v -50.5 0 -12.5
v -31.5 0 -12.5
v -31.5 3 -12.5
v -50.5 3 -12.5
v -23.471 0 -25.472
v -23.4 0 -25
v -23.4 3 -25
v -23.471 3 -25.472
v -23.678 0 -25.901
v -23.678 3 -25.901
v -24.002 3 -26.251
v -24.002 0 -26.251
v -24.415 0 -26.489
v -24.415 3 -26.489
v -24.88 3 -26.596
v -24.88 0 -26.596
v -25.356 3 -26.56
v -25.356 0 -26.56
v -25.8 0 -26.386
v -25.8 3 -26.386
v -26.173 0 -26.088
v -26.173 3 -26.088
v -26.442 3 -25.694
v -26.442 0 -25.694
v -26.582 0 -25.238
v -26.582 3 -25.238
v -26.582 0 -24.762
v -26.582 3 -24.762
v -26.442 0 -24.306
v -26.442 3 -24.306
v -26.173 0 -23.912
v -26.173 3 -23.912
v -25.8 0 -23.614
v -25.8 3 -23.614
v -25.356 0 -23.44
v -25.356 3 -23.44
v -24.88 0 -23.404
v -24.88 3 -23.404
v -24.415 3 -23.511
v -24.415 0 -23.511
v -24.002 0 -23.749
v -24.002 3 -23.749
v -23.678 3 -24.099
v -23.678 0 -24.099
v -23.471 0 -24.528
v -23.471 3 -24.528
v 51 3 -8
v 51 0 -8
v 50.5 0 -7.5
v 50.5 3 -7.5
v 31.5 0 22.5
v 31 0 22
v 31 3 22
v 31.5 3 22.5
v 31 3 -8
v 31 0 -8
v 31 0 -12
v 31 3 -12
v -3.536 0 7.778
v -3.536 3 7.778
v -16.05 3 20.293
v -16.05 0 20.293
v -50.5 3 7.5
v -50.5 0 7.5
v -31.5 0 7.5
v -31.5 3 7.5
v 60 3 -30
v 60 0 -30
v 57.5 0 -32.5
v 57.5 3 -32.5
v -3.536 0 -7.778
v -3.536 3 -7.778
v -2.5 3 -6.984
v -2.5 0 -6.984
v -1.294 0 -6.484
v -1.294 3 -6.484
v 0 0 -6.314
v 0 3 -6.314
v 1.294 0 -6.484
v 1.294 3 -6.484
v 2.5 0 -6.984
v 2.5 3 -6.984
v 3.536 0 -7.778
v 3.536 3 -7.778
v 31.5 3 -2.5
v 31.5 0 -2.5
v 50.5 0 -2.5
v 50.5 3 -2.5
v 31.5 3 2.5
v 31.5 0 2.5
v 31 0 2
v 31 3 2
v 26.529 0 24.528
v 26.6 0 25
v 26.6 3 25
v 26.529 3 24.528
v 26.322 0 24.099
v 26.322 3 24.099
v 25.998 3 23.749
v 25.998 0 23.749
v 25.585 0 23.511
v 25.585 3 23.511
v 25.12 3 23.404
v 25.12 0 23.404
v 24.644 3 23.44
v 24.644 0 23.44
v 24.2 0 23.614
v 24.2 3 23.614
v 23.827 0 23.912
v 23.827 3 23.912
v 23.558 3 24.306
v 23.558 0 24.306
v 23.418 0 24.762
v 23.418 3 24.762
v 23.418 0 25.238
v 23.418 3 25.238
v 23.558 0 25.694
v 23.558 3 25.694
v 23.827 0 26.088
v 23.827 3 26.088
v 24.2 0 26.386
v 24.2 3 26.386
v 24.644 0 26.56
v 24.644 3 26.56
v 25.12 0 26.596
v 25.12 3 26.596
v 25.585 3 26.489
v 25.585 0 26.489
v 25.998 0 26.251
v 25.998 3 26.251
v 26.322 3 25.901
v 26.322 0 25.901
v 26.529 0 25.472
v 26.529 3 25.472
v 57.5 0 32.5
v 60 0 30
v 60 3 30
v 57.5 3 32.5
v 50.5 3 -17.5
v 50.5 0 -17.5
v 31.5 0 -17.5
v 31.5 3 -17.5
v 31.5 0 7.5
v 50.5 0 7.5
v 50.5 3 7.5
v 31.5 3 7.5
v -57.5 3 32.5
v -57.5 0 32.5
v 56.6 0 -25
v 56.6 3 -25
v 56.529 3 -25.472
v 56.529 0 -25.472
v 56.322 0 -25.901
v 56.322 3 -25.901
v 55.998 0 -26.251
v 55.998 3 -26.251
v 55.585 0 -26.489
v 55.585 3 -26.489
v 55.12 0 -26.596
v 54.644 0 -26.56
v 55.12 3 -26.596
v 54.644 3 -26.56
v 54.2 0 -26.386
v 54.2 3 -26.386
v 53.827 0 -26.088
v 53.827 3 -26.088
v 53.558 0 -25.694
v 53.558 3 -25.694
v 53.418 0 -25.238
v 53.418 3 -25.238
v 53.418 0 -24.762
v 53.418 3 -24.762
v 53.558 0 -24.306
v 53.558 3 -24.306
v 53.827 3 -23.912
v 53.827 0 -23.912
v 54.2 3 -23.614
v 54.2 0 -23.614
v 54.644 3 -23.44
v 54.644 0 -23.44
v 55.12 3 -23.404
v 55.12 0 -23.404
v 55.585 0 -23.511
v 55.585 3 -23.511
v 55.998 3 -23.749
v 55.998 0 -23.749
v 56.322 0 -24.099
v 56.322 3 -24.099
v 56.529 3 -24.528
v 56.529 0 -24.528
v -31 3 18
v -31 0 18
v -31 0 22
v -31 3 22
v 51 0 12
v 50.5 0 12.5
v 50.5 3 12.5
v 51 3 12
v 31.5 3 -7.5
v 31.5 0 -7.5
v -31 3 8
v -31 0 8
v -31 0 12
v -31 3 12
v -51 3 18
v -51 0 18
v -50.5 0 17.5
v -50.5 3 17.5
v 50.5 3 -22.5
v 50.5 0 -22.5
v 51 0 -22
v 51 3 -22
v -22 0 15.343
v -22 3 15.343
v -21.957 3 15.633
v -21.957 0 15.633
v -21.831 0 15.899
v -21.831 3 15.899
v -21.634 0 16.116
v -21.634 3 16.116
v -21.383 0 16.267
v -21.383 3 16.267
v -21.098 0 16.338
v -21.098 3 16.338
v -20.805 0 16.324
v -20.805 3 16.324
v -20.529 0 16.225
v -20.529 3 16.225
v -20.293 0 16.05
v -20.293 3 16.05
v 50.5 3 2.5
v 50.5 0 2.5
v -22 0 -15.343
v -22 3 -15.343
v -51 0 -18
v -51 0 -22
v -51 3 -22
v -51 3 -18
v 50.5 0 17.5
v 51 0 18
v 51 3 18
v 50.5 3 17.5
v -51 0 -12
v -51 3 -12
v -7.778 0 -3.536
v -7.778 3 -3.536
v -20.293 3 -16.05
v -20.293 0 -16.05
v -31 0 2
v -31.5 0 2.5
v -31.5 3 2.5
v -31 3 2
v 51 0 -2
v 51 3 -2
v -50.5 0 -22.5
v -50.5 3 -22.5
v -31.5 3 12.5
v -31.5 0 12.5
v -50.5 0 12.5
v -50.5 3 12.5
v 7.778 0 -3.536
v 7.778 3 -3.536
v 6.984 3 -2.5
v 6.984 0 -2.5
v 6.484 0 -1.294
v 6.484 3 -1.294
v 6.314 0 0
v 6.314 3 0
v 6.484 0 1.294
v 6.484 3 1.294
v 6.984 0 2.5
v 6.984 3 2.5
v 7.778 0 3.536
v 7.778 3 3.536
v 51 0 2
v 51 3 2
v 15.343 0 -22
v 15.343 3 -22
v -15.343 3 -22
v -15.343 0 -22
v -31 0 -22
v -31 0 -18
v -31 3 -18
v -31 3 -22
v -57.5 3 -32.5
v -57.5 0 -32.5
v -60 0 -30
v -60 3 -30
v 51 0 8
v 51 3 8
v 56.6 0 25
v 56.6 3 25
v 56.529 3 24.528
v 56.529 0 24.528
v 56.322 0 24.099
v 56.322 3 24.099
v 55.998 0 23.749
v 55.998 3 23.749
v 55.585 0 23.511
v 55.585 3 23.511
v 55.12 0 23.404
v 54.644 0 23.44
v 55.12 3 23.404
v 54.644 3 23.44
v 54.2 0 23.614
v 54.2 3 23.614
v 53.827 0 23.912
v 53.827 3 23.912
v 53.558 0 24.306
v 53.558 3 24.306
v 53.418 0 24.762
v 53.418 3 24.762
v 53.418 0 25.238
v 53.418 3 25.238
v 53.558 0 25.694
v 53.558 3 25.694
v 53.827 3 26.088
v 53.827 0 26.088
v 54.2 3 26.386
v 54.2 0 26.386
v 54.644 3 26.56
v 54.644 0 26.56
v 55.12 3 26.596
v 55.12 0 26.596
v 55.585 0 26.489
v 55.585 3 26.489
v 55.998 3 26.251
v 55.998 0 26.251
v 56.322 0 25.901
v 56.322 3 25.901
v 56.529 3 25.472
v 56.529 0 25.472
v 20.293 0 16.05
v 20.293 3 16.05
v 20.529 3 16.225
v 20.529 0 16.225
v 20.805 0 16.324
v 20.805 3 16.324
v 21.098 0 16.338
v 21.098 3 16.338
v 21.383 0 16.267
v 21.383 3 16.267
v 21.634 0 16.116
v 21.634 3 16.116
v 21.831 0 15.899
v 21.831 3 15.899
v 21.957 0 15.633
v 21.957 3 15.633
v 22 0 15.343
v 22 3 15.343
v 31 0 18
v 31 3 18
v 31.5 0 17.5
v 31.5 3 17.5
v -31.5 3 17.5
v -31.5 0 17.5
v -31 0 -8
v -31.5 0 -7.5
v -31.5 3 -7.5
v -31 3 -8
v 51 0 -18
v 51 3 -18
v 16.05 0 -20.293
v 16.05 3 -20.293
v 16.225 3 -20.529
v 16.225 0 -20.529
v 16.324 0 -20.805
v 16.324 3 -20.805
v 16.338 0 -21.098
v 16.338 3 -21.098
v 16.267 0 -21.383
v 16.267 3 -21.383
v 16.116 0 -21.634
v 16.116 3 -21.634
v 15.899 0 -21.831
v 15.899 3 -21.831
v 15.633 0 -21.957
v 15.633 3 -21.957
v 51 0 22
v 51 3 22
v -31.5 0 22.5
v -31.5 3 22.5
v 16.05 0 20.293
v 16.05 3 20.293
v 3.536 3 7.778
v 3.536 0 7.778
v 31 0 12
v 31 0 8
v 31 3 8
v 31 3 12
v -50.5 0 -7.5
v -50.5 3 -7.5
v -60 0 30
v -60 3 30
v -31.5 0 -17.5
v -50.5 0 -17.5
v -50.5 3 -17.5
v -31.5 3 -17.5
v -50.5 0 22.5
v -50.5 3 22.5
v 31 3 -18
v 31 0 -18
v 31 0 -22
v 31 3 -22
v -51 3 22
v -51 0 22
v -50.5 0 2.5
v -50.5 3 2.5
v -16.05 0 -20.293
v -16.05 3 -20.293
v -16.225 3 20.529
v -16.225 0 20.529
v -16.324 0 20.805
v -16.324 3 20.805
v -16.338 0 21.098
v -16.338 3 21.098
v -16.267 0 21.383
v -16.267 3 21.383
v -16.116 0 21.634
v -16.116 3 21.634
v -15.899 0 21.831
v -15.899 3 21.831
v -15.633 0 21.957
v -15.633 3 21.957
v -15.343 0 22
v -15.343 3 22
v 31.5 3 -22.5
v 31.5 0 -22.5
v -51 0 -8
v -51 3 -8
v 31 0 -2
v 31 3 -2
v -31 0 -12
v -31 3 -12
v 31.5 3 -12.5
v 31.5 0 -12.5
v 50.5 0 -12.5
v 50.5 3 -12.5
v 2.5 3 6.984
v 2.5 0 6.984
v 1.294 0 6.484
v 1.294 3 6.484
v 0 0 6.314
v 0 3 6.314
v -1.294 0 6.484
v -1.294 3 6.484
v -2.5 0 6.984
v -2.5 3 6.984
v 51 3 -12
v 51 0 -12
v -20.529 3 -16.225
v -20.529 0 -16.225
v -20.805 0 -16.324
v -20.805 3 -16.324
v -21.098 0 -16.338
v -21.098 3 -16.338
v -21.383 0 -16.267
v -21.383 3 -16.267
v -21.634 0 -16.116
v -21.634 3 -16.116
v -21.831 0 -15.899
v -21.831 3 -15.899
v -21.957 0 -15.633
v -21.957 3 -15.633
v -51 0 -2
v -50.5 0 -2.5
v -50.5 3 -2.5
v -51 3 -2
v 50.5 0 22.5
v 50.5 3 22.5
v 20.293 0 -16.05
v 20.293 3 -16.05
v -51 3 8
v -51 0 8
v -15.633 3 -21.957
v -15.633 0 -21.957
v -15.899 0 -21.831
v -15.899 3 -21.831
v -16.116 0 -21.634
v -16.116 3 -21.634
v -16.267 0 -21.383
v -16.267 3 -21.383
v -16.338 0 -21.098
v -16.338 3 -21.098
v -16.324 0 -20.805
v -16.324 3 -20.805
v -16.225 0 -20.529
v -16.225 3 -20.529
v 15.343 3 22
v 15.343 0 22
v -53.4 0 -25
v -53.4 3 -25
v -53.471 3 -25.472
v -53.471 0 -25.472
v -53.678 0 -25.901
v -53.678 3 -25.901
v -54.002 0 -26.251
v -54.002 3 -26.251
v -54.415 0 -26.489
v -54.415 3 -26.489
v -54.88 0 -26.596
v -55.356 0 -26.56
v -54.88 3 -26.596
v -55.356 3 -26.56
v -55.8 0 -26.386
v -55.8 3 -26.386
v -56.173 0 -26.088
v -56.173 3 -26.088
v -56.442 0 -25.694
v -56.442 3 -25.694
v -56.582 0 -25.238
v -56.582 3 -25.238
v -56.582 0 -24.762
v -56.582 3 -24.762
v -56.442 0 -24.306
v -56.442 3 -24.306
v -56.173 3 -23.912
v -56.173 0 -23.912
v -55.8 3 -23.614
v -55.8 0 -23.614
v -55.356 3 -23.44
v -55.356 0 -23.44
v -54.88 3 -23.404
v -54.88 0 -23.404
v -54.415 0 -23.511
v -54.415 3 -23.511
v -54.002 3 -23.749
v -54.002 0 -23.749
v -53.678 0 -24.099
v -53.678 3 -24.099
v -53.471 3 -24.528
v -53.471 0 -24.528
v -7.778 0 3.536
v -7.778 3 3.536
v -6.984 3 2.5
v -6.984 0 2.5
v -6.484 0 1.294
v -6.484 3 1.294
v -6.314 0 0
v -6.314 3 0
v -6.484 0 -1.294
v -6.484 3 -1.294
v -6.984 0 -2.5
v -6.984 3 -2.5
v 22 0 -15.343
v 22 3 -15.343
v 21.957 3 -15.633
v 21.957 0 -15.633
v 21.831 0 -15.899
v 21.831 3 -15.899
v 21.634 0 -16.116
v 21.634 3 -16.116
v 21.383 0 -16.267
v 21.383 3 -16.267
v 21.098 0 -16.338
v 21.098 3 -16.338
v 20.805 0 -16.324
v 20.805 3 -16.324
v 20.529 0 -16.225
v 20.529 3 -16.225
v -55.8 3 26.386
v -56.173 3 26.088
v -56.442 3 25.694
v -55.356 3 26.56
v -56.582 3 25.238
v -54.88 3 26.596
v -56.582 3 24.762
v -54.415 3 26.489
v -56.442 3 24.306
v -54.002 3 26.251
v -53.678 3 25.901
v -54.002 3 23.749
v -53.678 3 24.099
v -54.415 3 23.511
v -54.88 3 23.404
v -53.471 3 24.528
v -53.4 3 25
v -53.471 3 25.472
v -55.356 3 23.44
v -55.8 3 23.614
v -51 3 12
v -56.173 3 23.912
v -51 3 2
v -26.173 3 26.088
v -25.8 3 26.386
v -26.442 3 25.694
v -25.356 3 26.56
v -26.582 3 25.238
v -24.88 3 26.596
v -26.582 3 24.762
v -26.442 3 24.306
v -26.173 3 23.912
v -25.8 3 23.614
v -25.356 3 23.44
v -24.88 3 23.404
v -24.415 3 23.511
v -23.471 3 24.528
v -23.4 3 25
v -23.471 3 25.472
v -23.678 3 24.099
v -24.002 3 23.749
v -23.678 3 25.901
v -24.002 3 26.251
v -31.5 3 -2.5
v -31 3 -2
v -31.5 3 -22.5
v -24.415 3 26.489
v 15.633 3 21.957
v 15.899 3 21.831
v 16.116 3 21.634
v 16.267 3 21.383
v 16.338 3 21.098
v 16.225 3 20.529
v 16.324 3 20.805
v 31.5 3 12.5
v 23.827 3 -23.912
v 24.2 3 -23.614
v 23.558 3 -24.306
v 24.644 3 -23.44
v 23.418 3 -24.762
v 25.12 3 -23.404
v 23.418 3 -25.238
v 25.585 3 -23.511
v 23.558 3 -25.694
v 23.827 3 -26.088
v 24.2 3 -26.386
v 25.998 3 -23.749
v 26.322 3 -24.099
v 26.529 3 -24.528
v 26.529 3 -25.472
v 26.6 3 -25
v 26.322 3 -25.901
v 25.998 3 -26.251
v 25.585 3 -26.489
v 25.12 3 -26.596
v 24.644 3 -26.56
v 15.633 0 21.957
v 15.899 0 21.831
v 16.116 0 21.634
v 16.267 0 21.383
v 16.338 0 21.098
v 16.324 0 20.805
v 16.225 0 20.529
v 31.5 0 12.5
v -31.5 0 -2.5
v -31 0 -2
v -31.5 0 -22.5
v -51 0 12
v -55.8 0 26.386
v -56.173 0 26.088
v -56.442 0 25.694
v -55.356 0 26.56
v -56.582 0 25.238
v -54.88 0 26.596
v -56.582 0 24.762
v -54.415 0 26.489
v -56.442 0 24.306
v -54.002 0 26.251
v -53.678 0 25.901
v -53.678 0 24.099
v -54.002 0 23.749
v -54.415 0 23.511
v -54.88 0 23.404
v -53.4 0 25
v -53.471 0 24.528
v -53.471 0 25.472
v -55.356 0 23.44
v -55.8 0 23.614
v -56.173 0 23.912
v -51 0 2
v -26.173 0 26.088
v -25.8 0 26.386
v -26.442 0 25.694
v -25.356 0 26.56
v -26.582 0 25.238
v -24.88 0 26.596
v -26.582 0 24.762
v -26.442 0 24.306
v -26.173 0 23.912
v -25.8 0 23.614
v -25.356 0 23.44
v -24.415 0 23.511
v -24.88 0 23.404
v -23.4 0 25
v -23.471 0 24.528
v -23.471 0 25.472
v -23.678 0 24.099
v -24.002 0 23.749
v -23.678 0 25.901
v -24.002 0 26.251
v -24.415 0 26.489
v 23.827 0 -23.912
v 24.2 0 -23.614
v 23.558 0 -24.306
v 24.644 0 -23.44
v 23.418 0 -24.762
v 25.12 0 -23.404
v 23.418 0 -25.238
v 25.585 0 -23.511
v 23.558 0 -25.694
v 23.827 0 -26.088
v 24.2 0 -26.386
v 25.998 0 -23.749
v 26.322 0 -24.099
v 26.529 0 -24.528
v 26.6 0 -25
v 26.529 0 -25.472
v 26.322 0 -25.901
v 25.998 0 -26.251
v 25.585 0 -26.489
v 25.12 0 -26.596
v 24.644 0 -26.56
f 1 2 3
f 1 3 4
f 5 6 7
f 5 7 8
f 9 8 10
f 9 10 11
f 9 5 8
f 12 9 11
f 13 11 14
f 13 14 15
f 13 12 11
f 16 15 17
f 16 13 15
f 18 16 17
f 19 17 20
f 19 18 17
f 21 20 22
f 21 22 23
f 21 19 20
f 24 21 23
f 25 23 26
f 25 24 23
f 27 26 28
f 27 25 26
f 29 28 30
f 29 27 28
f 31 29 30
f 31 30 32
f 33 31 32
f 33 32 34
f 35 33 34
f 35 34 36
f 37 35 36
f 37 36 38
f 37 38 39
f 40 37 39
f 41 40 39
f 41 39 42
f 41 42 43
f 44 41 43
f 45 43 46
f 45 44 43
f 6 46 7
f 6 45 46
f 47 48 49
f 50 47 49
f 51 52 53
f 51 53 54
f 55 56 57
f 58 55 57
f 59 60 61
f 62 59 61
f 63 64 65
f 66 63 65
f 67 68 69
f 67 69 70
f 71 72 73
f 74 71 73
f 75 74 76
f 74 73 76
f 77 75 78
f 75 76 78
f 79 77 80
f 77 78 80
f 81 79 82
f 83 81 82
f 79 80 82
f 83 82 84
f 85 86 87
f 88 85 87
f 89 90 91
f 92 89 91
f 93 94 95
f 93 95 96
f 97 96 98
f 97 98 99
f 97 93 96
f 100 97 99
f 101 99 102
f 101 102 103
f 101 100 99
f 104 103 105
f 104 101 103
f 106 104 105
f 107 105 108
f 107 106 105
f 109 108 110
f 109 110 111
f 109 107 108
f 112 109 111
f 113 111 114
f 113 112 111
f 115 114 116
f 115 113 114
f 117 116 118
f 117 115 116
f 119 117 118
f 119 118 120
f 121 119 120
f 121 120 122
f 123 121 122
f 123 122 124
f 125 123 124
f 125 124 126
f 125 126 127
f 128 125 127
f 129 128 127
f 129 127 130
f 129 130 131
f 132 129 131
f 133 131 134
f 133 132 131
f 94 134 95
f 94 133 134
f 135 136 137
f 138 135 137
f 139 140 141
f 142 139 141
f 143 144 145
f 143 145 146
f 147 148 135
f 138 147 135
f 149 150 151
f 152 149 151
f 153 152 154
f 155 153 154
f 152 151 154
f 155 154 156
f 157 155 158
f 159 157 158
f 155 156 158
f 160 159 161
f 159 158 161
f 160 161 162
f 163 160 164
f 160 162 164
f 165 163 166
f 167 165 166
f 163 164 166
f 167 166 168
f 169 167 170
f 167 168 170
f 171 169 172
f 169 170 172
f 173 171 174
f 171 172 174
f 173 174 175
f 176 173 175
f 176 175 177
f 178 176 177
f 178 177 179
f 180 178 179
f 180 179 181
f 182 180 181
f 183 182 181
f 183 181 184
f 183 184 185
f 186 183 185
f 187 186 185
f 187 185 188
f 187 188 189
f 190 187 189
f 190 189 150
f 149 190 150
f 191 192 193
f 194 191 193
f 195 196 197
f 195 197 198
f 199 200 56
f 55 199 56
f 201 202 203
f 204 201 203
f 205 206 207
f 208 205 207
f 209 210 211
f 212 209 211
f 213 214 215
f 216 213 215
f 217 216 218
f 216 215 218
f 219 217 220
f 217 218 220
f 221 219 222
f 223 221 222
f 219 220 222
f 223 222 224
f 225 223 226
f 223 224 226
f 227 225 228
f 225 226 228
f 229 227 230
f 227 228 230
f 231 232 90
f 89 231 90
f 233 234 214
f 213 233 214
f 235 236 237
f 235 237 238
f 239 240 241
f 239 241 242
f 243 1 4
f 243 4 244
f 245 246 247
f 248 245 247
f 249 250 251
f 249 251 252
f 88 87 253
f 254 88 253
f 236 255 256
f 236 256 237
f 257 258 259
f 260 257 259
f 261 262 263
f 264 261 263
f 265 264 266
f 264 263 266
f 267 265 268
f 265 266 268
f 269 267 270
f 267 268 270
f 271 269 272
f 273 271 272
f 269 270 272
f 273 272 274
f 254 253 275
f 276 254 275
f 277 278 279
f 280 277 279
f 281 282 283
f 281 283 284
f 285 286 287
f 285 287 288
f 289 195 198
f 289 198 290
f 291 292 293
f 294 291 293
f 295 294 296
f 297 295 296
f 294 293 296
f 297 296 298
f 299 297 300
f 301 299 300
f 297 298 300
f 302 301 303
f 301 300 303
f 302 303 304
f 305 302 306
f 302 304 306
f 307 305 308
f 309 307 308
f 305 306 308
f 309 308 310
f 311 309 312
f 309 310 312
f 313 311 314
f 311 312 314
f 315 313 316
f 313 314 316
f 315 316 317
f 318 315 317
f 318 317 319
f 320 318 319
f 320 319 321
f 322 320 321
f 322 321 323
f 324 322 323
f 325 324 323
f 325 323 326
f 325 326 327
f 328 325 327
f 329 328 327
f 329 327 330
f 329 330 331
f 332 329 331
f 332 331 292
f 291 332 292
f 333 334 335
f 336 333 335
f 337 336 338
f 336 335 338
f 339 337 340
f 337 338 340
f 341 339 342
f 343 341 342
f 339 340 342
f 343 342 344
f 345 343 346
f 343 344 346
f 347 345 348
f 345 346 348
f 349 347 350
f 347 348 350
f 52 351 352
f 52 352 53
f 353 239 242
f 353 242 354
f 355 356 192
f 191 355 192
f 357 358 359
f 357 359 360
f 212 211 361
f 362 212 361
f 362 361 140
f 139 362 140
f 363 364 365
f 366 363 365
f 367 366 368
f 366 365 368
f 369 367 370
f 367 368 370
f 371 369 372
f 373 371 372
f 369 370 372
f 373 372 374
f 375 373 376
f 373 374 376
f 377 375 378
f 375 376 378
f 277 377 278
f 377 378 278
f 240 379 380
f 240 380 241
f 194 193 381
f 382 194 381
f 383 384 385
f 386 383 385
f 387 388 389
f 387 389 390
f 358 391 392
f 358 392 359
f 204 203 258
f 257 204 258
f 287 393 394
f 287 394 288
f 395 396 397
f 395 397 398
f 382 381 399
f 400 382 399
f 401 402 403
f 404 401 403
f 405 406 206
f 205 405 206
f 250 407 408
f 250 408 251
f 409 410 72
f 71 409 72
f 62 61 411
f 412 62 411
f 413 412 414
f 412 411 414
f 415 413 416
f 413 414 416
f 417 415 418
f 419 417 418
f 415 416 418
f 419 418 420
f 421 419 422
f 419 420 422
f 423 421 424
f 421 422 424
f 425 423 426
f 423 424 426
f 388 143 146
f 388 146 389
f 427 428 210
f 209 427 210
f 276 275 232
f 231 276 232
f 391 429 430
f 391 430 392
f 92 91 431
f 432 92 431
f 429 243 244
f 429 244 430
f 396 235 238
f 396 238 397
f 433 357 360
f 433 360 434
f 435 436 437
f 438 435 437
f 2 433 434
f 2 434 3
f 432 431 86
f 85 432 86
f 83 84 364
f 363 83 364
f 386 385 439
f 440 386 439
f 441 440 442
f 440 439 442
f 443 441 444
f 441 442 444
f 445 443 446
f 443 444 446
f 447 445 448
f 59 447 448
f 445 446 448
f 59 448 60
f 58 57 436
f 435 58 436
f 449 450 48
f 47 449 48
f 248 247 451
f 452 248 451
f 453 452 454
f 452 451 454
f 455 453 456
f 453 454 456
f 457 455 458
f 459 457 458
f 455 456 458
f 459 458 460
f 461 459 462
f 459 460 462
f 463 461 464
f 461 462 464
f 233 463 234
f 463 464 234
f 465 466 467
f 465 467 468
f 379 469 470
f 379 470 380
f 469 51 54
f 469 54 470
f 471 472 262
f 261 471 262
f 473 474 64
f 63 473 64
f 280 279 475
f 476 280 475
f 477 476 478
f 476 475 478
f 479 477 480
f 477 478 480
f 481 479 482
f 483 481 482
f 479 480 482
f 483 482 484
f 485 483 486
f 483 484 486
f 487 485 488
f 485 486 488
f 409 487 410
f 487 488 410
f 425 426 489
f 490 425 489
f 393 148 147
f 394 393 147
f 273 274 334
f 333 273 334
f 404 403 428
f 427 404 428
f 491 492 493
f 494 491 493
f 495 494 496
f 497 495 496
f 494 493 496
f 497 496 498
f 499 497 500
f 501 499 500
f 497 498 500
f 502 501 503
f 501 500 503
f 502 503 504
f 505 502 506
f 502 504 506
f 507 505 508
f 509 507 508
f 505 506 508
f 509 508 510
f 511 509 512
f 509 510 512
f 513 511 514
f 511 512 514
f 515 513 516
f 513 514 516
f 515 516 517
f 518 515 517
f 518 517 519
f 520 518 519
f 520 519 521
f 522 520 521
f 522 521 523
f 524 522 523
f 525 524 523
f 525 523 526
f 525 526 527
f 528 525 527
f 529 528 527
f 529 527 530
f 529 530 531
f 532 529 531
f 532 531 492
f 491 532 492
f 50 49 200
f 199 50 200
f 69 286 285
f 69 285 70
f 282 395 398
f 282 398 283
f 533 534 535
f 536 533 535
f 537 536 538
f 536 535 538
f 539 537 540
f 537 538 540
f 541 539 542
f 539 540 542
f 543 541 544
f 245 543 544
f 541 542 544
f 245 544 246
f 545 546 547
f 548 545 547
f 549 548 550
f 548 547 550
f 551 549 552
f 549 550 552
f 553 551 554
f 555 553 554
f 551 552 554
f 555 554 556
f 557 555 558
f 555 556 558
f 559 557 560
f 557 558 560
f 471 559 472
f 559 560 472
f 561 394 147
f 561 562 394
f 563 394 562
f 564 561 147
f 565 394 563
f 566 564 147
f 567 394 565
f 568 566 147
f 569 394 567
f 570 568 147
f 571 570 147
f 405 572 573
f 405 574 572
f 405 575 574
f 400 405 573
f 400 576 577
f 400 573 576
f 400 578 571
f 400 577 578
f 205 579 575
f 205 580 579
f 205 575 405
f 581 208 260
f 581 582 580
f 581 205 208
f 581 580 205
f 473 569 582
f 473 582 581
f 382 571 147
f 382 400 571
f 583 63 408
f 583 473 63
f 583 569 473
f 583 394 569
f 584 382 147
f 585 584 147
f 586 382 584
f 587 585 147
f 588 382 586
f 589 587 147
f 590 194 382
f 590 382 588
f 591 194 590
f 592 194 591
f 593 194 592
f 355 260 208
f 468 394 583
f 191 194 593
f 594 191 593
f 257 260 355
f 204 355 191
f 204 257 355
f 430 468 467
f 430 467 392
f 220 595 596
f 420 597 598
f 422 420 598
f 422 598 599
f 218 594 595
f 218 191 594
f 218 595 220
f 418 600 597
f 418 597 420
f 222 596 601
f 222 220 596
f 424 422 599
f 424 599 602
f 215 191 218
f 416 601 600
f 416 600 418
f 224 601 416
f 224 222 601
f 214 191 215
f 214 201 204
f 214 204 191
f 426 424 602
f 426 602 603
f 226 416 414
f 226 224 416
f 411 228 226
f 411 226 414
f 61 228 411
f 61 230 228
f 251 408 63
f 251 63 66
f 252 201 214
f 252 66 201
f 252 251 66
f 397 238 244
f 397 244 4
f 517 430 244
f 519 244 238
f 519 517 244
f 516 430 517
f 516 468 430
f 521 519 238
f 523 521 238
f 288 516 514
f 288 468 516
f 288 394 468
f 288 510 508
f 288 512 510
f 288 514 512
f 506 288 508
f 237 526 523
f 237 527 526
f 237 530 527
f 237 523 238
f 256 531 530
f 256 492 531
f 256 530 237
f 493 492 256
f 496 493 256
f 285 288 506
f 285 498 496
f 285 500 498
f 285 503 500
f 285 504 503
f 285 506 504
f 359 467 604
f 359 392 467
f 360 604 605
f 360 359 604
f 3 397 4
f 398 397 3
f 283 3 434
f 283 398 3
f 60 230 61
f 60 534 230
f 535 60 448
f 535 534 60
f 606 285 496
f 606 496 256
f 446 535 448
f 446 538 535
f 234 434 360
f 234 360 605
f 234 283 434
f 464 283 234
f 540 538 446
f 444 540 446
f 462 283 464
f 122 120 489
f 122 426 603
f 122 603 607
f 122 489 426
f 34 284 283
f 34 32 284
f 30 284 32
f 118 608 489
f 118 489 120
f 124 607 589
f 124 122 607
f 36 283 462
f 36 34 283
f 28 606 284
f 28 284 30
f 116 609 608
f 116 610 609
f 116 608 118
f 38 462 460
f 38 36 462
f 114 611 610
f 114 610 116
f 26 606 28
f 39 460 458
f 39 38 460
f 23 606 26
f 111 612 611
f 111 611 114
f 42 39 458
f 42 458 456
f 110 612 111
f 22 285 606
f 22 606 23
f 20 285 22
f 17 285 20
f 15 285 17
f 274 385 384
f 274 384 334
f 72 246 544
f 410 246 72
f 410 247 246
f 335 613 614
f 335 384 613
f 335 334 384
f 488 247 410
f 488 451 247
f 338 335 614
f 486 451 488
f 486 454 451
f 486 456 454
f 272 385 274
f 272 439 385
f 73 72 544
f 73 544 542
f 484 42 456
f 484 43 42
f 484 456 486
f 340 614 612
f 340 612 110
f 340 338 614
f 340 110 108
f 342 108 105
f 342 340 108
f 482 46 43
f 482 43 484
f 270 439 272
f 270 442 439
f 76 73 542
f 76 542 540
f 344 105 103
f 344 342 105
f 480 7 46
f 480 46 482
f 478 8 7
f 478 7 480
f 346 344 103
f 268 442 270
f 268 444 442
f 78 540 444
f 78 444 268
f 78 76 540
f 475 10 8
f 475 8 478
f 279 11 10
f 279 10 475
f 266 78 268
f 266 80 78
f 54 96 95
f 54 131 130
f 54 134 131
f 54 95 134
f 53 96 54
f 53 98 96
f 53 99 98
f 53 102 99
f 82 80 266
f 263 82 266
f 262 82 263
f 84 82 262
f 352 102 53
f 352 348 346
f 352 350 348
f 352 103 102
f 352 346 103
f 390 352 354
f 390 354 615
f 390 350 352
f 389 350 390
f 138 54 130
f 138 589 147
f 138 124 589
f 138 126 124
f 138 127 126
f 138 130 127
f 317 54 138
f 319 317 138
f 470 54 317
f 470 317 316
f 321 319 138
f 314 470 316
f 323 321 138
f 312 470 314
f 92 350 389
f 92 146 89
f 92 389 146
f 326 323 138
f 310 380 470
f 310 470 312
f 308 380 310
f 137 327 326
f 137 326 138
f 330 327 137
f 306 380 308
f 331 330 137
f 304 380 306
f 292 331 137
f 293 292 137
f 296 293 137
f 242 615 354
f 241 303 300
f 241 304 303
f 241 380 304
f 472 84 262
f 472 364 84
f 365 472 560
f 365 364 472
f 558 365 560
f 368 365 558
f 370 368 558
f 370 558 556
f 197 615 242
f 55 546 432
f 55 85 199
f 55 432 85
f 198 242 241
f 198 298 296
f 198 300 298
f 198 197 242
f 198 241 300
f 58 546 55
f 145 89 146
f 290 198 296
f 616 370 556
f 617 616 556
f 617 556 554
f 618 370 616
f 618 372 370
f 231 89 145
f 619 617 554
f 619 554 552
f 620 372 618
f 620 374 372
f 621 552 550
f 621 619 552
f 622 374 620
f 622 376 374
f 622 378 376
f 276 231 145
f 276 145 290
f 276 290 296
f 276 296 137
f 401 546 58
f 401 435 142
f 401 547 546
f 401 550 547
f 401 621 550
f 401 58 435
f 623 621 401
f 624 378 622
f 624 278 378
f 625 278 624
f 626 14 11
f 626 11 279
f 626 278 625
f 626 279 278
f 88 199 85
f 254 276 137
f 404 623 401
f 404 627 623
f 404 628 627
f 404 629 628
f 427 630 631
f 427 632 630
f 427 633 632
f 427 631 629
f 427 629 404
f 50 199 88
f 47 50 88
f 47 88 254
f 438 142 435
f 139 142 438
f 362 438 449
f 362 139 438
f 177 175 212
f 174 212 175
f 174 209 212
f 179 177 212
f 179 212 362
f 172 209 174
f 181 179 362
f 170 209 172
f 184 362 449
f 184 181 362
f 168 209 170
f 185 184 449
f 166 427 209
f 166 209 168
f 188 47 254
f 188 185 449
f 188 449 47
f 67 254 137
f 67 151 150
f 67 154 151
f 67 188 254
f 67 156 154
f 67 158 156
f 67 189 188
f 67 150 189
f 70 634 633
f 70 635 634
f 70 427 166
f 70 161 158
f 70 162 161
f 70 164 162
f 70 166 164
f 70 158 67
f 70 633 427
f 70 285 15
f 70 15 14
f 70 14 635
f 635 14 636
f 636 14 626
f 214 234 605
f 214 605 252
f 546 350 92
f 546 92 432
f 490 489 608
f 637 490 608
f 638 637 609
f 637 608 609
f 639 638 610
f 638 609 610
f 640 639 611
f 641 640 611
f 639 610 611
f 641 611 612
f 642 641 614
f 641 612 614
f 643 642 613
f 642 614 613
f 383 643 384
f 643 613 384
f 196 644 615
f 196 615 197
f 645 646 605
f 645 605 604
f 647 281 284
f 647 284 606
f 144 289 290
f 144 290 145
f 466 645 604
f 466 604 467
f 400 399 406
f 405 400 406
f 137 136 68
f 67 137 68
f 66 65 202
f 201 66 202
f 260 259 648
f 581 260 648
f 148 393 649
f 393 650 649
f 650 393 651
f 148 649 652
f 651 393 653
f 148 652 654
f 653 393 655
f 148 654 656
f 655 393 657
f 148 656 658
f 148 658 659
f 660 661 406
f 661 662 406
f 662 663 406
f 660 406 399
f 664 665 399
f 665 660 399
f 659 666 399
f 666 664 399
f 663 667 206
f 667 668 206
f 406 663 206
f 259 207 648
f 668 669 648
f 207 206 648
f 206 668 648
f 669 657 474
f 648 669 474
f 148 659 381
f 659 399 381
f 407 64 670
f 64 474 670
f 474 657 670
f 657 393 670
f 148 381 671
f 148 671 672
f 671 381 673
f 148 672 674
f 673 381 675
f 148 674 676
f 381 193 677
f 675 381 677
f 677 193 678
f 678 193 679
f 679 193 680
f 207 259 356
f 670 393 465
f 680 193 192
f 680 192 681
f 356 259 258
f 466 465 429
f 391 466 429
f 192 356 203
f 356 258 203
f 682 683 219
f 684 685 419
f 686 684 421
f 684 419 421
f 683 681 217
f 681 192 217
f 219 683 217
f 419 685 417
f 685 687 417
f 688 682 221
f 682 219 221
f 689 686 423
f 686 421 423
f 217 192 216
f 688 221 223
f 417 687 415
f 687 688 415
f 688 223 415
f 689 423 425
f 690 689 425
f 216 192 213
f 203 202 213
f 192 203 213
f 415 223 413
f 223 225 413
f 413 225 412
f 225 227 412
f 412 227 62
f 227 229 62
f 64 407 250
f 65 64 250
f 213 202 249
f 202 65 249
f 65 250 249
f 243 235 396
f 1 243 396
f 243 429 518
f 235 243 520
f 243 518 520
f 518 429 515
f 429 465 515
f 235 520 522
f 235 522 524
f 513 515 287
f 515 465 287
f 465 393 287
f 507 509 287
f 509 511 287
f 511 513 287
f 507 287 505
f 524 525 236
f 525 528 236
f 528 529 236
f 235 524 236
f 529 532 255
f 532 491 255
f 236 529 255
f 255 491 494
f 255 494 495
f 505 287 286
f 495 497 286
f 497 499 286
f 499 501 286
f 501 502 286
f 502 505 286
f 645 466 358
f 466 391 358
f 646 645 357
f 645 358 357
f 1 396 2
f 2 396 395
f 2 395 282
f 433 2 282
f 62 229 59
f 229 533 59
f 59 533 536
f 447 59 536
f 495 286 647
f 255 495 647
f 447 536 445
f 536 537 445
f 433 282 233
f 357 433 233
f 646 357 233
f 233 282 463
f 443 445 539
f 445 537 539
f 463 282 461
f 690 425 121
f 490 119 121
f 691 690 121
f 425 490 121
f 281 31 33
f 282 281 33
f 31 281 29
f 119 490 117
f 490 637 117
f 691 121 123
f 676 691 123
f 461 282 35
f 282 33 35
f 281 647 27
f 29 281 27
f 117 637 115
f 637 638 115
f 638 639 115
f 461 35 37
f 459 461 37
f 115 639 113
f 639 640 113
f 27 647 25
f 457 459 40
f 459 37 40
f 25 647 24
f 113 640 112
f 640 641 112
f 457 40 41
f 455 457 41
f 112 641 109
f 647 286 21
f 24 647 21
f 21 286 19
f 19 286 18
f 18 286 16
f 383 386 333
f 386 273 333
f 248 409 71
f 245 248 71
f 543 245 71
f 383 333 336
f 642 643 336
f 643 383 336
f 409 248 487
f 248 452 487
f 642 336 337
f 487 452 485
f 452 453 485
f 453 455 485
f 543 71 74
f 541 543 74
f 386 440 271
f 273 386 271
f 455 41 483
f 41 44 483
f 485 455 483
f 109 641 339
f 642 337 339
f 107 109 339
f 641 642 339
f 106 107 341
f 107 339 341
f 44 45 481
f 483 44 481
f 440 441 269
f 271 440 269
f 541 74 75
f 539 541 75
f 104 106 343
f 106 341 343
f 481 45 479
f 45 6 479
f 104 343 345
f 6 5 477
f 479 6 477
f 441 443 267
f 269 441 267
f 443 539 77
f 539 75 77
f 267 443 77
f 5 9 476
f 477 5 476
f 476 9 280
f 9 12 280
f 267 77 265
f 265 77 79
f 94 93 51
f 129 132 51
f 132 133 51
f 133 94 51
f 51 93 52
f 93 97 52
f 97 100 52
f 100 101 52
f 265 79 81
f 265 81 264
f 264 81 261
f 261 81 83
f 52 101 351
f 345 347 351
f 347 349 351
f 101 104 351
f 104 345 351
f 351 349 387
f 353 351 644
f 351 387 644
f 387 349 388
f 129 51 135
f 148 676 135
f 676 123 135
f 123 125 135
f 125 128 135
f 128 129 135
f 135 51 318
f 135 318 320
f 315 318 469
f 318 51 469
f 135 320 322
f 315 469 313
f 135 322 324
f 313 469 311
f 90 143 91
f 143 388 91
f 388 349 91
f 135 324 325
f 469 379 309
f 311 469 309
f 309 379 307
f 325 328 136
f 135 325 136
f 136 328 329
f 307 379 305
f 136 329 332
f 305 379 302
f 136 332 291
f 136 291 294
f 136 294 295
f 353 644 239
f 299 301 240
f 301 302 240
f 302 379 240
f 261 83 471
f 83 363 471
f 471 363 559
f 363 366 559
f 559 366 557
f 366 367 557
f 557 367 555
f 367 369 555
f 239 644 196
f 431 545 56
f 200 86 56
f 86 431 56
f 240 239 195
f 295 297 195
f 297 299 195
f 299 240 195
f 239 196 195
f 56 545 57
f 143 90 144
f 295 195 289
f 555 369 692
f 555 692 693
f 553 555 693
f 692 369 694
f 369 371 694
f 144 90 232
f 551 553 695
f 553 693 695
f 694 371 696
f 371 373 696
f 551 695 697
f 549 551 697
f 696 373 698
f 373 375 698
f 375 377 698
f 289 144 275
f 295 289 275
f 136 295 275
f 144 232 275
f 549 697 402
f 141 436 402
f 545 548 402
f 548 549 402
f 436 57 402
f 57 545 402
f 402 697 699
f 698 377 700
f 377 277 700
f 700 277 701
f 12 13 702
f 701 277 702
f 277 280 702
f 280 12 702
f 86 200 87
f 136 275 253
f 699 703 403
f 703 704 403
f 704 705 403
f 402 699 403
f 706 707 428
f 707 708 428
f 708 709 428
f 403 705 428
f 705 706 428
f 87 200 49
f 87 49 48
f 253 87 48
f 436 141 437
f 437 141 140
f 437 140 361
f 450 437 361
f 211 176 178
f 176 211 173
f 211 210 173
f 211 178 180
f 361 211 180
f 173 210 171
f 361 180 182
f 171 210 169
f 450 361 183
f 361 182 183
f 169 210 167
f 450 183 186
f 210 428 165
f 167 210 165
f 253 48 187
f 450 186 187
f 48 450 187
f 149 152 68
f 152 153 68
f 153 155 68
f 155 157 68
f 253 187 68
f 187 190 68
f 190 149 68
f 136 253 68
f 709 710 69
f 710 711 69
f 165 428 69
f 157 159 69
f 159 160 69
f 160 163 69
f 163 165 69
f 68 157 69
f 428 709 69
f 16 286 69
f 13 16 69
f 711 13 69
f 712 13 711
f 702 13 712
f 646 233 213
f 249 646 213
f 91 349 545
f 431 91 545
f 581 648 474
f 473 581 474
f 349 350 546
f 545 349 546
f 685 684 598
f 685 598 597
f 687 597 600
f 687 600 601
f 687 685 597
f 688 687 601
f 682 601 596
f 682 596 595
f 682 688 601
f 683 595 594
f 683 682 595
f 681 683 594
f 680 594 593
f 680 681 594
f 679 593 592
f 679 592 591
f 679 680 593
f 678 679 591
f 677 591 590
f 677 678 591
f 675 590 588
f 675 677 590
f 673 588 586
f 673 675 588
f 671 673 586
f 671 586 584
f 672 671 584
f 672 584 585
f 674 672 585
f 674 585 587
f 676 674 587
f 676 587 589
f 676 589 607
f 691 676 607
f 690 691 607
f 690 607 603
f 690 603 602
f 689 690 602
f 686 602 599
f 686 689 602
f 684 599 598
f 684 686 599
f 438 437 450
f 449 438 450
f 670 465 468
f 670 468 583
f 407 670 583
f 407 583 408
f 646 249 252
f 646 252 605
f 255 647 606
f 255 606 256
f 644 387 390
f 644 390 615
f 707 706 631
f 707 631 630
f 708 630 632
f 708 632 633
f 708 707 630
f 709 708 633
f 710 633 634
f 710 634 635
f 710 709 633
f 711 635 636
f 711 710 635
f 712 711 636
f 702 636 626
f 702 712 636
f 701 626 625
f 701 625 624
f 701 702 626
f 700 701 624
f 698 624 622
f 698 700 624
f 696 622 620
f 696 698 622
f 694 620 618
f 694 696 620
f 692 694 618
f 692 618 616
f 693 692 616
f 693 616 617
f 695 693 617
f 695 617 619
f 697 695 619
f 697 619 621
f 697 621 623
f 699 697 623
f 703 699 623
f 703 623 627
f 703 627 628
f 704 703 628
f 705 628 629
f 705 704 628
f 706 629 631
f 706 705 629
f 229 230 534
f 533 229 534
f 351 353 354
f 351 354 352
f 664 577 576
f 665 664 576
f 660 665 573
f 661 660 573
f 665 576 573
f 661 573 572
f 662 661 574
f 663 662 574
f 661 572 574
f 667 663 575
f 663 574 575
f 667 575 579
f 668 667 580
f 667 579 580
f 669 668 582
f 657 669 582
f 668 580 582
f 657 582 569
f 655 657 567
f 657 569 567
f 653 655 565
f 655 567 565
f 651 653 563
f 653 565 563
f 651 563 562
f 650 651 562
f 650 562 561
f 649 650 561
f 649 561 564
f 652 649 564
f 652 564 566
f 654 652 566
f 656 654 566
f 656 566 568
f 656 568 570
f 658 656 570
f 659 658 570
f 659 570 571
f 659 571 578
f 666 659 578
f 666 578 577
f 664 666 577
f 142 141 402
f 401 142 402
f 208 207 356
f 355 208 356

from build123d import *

# Parameters (mm, degrees)
SKETCH_1_W          = 120
SKETCH_1_H          = 65
SKETCH_1_R          = 1.6
EXTRUDE_1_DEPTH     = 3
CUT_EXTRUDE_1_REACH = 5
SKETCH_2_R          = 1.6
CUT_EXTRUDE_2_REACH = 5
CUT_EXTRUDE_3_DEPTH = 3
CHAMFER_1_SIZE      = 2.5


with BuildPart() as part:
    # 草图1 → 凸台-拉伸1 (new body)
    with BuildSketch(Plane(origin=(0, 0, 0), x_dir=(1, 0, 0), z_dir=(0, 1, 0))):
        Rectangle(SKETCH_1_W, SKETCH_1_H)
        with Locations((-25, 25)):
            Circle(SKETCH_1_R, mode=Mode.SUBTRACT)
        with Locations((25, 25)):
            Circle(SKETCH_1_R, mode=Mode.SUBTRACT)
        with Locations((25, -25)):
            Circle(SKETCH_1_R, mode=Mode.SUBTRACT)
        with Locations((-25, -25)):
            Circle(SKETCH_1_R, mode=Mode.SUBTRACT)
    extrude(amount=EXTRUDE_1_DEPTH)

    # 草图2 → 切除-拉伸1 (cut, up to next)
    with BuildSketch(Plane(origin=(0, 3, 0), x_dir=(1, 0, 0), z_dir=(0, 1, 0)), mode=Mode.PRIVATE) as cut_extrude_1_sk1:
        with Locations((55, 25)):
            Circle(SKETCH_2_R)
    cut_extrude_1_tool1 = extrude(cut_extrude_1_sk1.sketch, amount=-CUT_EXTRUDE_1_REACH, mode=Mode.PRIVATE) & part.part
    add(cut_extrude_1_tool1.solids().sort_by_distance((55, 3, -25))[0], mode=Mode.SUBTRACT)
    # 草图2 → 切除-拉伸1 (cut, up to next)
    with BuildSketch(Plane(origin=(0, 3, 0), x_dir=(1, 0, 0), z_dir=(0, 1, 0)), mode=Mode.PRIVATE) as cut_extrude_1_sk2:
        with Locations((55, -25)):
            Circle(SKETCH_2_R)
    cut_extrude_1_tool2 = extrude(cut_extrude_1_sk2.sketch, amount=-CUT_EXTRUDE_1_REACH, mode=Mode.PRIVATE) & part.part
    add(cut_extrude_1_tool2.solids().sort_by_distance((55, 3, 25))[0], mode=Mode.SUBTRACT)
    # 草图2 → 切除-拉伸1 (cut, up to next)
    with BuildSketch(Plane(origin=(0, 3, 0), x_dir=(1, 0, 0), z_dir=(0, 1, 0)), mode=Mode.PRIVATE) as cut_extrude_1_sk3:
        with Locations((-55, -25)):
            Circle(SKETCH_2_R)
    cut_extrude_1_tool3 = extrude(cut_extrude_1_sk3.sketch, amount=-CUT_EXTRUDE_1_REACH, mode=Mode.PRIVATE) & part.part
    add(cut_extrude_1_tool3.solids().sort_by_distance((-55, 3, 25))[0], mode=Mode.SUBTRACT)
    # 草图2 → 切除-拉伸1 (cut, up to next)
    with BuildSketch(Plane(origin=(0, 3, 0), x_dir=(1, 0, 0), z_dir=(0, 1, 0)), mode=Mode.PRIVATE) as cut_extrude_1_sk4:
        with Locations((-55, 25)):
            Circle(SKETCH_2_R)
    cut_extrude_1_tool4 = extrude(cut_extrude_1_sk4.sketch, amount=-CUT_EXTRUDE_1_REACH, mode=Mode.PRIVATE) & part.part
    add(cut_extrude_1_tool4.solids().sort_by_distance((-55, 3, -25))[0], mode=Mode.SUBTRACT)

    # 草图3 → 切除-拉伸2 (cut, up to next)
    with BuildSketch(Plane(origin=(0, 3, 0), x_dir=(1, 0, 0), z_dir=(0, 1, 0)), mode=Mode.PRIVATE) as cut_extrude_2_sk1:
        with BuildLine():
            Line((-22, 15.343145751), (-22, -15.343145751))
            ThreePointArc((-22, -15.343145751), (-21.382683432, -16.267025283), (-20.292893219, -16.050252532))
            Line((-20.292893219, -16.050252532), (-7.778174593, -3.535533906))
            ThreePointArc((-7.778174593, -3.535533906), (-6.313708499, 0), (-7.778174593, 3.535533906))
            Line((-7.778174593, 3.535533906), (-20.292893219, 16.050252532))
            ThreePointArc((-20.292893219, 16.050252532), (-21.382683432, 16.267025283), (-22, 15.343145751))
        make_face()
    cut_extrude_2_tool1 = extrude(cut_extrude_2_sk1.sketch, amount=-CUT_EXTRUDE_2_REACH, mode=Mode.PRIVATE) & part.part
    add(cut_extrude_2_tool1.solids().sort_by_distance((-16.215858, 3, 0))[0], mode=Mode.SUBTRACT)
    # 草图3 → 切除-拉伸2 (cut, up to next)
    with BuildSketch(Plane(origin=(0, 3, 0), x_dir=(1, 0, 0), z_dir=(0, 1, 0)), mode=Mode.PRIVATE) as cut_extrude_2_sk2:
        with BuildLine():
            Line((15.343145751, 22), (-15.343145751, 22))
            ThreePointArc((-15.343145751, 22), (-16.267025283, 21.382683432), (-16.050252532, 20.292893219))
            Line((-16.050252532, 20.292893219), (-3.535533906, 7.778174593))
            ThreePointArc((-3.535533906, 7.778174593), (0, 6.313708499), (3.535533906, 7.778174593))
            Line((3.535533906, 7.778174593), (16.050252532, 20.292893219))
            ThreePointArc((16.050252532, 20.292893219), (16.267025283, 21.382683432), (15.343145751, 22))
        make_face()
    cut_extrude_2_tool2 = extrude(cut_extrude_2_sk2.sketch, amount=-CUT_EXTRUDE_2_REACH, mode=Mode.PRIVATE) & part.part
    add(cut_extrude_2_tool2.solids().sort_by_distance((0, 3, -16.215858))[0], mode=Mode.SUBTRACT)
    # 草图3 → 切除-拉伸2 (cut, up to next)
    with BuildSketch(Plane(origin=(0, 3, 0), x_dir=(1, 0, 0), z_dir=(0, 1, 0)), mode=Mode.PRIVATE) as cut_extrude_2_sk3:
        with BuildLine():
            Line((22, -15.343145751), (22, 15.343145751))
            ThreePointArc((22, 15.343145751), (21.382683432, 16.267025283), (20.292893219, 16.050252532))
            Line((20.292893219, 16.050252532), (7.778174593, 3.535533906))
            ThreePointArc((7.778174593, 3.535533906), (6.313708499, 0), (7.778174593, -3.535533906))
            Line((7.778174593, -3.535533906), (20.292893219, -16.050252532))
            ThreePointArc((20.292893219, -16.050252532), (21.382683432, -16.267025283), (22, -15.343145751))
        make_face()
    cut_extrude_2_tool3 = extrude(cut_extrude_2_sk3.sketch, amount=-CUT_EXTRUDE_2_REACH, mode=Mode.PRIVATE) & part.part
    add(cut_extrude_2_tool3.solids().sort_by_distance((16.215858, 3, 0))[0], mode=Mode.SUBTRACT)
    # 草图3 → 切除-拉伸2 (cut, up to next)
    with BuildSketch(Plane(origin=(0, 3, 0), x_dir=(1, 0, 0), z_dir=(0, 1, 0)), mode=Mode.PRIVATE) as cut_extrude_2_sk4:
        with BuildLine():
            Line((-15.343145751, -22), (15.343145751, -22))
            ThreePointArc((15.343145751, -22), (16.267025283, -21.382683432), (16.050252532, -20.292893219))
            Line((16.050252532, -20.292893219), (3.535533906, -7.778174593))
            ThreePointArc((3.535533906, -7.778174593), (0, -6.313708499), (-3.535533906, -7.778174593))
            Line((-3.535533906, -7.778174593), (-16.050252532, -20.292893219))
            ThreePointArc((-16.050252532, -20.292893219), (-16.267025283, -21.382683432), (-15.343145751, -22))
        make_face()
    cut_extrude_2_tool4 = extrude(cut_extrude_2_sk4.sketch, amount=-CUT_EXTRUDE_2_REACH, mode=Mode.PRIVATE) & part.part
    add(cut_extrude_2_tool4.solids().sort_by_distance((0, 3, 16.215858))[0], mode=Mode.SUBTRACT)

    # 草图4 → 切除-拉伸3 (cut)
    with BuildSketch(Plane.XZ):
        Polygon((50.5, -2.5), (51, -2), (51, 2), (50.5, 2.5), (31.5, 2.5), (31, 2), (31, -2), (31.5, -2.5), align=None)
        Polygon((50.5, 7.5), (31.5, 7.5), (31, 8), (31, 12), (31.5, 12.5), (50.5, 12.5), (51, 12), (51, 8), align=None)
        Polygon((50.5, 17.5), (31.5, 17.5), (31, 18), (31, 22), (31.5, 22.5), (50.5, 22.5), (51, 22), (51, 18), align=None)
        Polygon((31.5, -17.5), (31, -18), (31, -22), (31.5, -22.5), (50.5, -22.5), (51, -22), (51, -18), (50.5, -17.5), align=None)
        Polygon((31.5, -7.5), (31, -8), (31, -12), (31.5, -12.5), (50.5, -12.5), (51, -12), (51, -8), (50.5, -7.5), align=None)
        Polygon((-50.5, -7.5), (-31.5, -7.5), (-31, -8), (-31, -12), (-31.5, -12.5), (-50.5, -12.5), (-51, -12), (-51, -8), align=None)
        Polygon((-50.5, -17.5), (-31.5, -17.5), (-31, -18), (-31, -22), (-31.5, -22.5), (-50.5, -22.5), (-51, -22), (-51, -18), align=None)
        Polygon((-31.5, 17.5), (-31, 18), (-31, 22), (-31.5, 22.5), (-50.5, 22.5), (-51, 22), (-51, 18), (-50.5, 17.5), align=None)
        Polygon((-31.5, 7.5), (-31, 8), (-31, 12), (-31.5, 12.5), (-50.5, 12.5), (-51, 12), (-51, 8), (-50.5, 7.5), align=None)
        Polygon((-31.5, 2.5), (-31, 2), (-31, -2), (-31.5, -2.5), (-50.5, -2.5), (-51, -2), (-51, 2), (-50.5, 2.5), align=None)
    extrude(amount=-CUT_EXTRUDE_3_DEPTH, mode=Mode.SUBTRACT)

    # 倒角1
    chamfer_1_edges = [part.edges().sort_by_distance(p)[0] for p in [
        (60, 1.5, 32.5),
        (-60, 1.5, 32.5),
        (-60, 1.5, -32.5),
        (60, 1.5, -32.5),
    ]]
    chamfer(chamfer_1_edges, length=CHAMFER_1_SIZE)


solid = part.part
